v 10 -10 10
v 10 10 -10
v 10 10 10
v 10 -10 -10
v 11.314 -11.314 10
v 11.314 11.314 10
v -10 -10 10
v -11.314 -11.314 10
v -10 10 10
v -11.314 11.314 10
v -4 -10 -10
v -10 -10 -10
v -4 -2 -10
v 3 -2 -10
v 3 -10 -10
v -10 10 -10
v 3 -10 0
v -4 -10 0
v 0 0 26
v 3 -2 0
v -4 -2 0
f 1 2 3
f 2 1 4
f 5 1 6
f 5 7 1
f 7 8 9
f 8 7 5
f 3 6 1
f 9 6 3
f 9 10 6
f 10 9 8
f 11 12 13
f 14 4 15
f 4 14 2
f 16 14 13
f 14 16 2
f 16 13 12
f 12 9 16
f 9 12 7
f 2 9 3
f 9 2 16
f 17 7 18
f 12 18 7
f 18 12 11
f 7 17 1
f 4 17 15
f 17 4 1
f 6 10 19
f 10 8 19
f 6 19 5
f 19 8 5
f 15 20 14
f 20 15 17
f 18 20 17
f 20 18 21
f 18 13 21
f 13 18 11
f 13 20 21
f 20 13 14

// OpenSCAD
difference() {
    union() { 
        cube(20,true);
        translate([0,0,10]) {
            union() {
                scale([0.8, 0.8, 0.8]) {
                    rotate([0,0,45]) {
                        cylinder(20,20,00,$fn=4);
                    }
                }
            }
        }
    };
    translate([-4, -12, -10]) {
        cube(size=[7,10,10],center=false);
    }
}
